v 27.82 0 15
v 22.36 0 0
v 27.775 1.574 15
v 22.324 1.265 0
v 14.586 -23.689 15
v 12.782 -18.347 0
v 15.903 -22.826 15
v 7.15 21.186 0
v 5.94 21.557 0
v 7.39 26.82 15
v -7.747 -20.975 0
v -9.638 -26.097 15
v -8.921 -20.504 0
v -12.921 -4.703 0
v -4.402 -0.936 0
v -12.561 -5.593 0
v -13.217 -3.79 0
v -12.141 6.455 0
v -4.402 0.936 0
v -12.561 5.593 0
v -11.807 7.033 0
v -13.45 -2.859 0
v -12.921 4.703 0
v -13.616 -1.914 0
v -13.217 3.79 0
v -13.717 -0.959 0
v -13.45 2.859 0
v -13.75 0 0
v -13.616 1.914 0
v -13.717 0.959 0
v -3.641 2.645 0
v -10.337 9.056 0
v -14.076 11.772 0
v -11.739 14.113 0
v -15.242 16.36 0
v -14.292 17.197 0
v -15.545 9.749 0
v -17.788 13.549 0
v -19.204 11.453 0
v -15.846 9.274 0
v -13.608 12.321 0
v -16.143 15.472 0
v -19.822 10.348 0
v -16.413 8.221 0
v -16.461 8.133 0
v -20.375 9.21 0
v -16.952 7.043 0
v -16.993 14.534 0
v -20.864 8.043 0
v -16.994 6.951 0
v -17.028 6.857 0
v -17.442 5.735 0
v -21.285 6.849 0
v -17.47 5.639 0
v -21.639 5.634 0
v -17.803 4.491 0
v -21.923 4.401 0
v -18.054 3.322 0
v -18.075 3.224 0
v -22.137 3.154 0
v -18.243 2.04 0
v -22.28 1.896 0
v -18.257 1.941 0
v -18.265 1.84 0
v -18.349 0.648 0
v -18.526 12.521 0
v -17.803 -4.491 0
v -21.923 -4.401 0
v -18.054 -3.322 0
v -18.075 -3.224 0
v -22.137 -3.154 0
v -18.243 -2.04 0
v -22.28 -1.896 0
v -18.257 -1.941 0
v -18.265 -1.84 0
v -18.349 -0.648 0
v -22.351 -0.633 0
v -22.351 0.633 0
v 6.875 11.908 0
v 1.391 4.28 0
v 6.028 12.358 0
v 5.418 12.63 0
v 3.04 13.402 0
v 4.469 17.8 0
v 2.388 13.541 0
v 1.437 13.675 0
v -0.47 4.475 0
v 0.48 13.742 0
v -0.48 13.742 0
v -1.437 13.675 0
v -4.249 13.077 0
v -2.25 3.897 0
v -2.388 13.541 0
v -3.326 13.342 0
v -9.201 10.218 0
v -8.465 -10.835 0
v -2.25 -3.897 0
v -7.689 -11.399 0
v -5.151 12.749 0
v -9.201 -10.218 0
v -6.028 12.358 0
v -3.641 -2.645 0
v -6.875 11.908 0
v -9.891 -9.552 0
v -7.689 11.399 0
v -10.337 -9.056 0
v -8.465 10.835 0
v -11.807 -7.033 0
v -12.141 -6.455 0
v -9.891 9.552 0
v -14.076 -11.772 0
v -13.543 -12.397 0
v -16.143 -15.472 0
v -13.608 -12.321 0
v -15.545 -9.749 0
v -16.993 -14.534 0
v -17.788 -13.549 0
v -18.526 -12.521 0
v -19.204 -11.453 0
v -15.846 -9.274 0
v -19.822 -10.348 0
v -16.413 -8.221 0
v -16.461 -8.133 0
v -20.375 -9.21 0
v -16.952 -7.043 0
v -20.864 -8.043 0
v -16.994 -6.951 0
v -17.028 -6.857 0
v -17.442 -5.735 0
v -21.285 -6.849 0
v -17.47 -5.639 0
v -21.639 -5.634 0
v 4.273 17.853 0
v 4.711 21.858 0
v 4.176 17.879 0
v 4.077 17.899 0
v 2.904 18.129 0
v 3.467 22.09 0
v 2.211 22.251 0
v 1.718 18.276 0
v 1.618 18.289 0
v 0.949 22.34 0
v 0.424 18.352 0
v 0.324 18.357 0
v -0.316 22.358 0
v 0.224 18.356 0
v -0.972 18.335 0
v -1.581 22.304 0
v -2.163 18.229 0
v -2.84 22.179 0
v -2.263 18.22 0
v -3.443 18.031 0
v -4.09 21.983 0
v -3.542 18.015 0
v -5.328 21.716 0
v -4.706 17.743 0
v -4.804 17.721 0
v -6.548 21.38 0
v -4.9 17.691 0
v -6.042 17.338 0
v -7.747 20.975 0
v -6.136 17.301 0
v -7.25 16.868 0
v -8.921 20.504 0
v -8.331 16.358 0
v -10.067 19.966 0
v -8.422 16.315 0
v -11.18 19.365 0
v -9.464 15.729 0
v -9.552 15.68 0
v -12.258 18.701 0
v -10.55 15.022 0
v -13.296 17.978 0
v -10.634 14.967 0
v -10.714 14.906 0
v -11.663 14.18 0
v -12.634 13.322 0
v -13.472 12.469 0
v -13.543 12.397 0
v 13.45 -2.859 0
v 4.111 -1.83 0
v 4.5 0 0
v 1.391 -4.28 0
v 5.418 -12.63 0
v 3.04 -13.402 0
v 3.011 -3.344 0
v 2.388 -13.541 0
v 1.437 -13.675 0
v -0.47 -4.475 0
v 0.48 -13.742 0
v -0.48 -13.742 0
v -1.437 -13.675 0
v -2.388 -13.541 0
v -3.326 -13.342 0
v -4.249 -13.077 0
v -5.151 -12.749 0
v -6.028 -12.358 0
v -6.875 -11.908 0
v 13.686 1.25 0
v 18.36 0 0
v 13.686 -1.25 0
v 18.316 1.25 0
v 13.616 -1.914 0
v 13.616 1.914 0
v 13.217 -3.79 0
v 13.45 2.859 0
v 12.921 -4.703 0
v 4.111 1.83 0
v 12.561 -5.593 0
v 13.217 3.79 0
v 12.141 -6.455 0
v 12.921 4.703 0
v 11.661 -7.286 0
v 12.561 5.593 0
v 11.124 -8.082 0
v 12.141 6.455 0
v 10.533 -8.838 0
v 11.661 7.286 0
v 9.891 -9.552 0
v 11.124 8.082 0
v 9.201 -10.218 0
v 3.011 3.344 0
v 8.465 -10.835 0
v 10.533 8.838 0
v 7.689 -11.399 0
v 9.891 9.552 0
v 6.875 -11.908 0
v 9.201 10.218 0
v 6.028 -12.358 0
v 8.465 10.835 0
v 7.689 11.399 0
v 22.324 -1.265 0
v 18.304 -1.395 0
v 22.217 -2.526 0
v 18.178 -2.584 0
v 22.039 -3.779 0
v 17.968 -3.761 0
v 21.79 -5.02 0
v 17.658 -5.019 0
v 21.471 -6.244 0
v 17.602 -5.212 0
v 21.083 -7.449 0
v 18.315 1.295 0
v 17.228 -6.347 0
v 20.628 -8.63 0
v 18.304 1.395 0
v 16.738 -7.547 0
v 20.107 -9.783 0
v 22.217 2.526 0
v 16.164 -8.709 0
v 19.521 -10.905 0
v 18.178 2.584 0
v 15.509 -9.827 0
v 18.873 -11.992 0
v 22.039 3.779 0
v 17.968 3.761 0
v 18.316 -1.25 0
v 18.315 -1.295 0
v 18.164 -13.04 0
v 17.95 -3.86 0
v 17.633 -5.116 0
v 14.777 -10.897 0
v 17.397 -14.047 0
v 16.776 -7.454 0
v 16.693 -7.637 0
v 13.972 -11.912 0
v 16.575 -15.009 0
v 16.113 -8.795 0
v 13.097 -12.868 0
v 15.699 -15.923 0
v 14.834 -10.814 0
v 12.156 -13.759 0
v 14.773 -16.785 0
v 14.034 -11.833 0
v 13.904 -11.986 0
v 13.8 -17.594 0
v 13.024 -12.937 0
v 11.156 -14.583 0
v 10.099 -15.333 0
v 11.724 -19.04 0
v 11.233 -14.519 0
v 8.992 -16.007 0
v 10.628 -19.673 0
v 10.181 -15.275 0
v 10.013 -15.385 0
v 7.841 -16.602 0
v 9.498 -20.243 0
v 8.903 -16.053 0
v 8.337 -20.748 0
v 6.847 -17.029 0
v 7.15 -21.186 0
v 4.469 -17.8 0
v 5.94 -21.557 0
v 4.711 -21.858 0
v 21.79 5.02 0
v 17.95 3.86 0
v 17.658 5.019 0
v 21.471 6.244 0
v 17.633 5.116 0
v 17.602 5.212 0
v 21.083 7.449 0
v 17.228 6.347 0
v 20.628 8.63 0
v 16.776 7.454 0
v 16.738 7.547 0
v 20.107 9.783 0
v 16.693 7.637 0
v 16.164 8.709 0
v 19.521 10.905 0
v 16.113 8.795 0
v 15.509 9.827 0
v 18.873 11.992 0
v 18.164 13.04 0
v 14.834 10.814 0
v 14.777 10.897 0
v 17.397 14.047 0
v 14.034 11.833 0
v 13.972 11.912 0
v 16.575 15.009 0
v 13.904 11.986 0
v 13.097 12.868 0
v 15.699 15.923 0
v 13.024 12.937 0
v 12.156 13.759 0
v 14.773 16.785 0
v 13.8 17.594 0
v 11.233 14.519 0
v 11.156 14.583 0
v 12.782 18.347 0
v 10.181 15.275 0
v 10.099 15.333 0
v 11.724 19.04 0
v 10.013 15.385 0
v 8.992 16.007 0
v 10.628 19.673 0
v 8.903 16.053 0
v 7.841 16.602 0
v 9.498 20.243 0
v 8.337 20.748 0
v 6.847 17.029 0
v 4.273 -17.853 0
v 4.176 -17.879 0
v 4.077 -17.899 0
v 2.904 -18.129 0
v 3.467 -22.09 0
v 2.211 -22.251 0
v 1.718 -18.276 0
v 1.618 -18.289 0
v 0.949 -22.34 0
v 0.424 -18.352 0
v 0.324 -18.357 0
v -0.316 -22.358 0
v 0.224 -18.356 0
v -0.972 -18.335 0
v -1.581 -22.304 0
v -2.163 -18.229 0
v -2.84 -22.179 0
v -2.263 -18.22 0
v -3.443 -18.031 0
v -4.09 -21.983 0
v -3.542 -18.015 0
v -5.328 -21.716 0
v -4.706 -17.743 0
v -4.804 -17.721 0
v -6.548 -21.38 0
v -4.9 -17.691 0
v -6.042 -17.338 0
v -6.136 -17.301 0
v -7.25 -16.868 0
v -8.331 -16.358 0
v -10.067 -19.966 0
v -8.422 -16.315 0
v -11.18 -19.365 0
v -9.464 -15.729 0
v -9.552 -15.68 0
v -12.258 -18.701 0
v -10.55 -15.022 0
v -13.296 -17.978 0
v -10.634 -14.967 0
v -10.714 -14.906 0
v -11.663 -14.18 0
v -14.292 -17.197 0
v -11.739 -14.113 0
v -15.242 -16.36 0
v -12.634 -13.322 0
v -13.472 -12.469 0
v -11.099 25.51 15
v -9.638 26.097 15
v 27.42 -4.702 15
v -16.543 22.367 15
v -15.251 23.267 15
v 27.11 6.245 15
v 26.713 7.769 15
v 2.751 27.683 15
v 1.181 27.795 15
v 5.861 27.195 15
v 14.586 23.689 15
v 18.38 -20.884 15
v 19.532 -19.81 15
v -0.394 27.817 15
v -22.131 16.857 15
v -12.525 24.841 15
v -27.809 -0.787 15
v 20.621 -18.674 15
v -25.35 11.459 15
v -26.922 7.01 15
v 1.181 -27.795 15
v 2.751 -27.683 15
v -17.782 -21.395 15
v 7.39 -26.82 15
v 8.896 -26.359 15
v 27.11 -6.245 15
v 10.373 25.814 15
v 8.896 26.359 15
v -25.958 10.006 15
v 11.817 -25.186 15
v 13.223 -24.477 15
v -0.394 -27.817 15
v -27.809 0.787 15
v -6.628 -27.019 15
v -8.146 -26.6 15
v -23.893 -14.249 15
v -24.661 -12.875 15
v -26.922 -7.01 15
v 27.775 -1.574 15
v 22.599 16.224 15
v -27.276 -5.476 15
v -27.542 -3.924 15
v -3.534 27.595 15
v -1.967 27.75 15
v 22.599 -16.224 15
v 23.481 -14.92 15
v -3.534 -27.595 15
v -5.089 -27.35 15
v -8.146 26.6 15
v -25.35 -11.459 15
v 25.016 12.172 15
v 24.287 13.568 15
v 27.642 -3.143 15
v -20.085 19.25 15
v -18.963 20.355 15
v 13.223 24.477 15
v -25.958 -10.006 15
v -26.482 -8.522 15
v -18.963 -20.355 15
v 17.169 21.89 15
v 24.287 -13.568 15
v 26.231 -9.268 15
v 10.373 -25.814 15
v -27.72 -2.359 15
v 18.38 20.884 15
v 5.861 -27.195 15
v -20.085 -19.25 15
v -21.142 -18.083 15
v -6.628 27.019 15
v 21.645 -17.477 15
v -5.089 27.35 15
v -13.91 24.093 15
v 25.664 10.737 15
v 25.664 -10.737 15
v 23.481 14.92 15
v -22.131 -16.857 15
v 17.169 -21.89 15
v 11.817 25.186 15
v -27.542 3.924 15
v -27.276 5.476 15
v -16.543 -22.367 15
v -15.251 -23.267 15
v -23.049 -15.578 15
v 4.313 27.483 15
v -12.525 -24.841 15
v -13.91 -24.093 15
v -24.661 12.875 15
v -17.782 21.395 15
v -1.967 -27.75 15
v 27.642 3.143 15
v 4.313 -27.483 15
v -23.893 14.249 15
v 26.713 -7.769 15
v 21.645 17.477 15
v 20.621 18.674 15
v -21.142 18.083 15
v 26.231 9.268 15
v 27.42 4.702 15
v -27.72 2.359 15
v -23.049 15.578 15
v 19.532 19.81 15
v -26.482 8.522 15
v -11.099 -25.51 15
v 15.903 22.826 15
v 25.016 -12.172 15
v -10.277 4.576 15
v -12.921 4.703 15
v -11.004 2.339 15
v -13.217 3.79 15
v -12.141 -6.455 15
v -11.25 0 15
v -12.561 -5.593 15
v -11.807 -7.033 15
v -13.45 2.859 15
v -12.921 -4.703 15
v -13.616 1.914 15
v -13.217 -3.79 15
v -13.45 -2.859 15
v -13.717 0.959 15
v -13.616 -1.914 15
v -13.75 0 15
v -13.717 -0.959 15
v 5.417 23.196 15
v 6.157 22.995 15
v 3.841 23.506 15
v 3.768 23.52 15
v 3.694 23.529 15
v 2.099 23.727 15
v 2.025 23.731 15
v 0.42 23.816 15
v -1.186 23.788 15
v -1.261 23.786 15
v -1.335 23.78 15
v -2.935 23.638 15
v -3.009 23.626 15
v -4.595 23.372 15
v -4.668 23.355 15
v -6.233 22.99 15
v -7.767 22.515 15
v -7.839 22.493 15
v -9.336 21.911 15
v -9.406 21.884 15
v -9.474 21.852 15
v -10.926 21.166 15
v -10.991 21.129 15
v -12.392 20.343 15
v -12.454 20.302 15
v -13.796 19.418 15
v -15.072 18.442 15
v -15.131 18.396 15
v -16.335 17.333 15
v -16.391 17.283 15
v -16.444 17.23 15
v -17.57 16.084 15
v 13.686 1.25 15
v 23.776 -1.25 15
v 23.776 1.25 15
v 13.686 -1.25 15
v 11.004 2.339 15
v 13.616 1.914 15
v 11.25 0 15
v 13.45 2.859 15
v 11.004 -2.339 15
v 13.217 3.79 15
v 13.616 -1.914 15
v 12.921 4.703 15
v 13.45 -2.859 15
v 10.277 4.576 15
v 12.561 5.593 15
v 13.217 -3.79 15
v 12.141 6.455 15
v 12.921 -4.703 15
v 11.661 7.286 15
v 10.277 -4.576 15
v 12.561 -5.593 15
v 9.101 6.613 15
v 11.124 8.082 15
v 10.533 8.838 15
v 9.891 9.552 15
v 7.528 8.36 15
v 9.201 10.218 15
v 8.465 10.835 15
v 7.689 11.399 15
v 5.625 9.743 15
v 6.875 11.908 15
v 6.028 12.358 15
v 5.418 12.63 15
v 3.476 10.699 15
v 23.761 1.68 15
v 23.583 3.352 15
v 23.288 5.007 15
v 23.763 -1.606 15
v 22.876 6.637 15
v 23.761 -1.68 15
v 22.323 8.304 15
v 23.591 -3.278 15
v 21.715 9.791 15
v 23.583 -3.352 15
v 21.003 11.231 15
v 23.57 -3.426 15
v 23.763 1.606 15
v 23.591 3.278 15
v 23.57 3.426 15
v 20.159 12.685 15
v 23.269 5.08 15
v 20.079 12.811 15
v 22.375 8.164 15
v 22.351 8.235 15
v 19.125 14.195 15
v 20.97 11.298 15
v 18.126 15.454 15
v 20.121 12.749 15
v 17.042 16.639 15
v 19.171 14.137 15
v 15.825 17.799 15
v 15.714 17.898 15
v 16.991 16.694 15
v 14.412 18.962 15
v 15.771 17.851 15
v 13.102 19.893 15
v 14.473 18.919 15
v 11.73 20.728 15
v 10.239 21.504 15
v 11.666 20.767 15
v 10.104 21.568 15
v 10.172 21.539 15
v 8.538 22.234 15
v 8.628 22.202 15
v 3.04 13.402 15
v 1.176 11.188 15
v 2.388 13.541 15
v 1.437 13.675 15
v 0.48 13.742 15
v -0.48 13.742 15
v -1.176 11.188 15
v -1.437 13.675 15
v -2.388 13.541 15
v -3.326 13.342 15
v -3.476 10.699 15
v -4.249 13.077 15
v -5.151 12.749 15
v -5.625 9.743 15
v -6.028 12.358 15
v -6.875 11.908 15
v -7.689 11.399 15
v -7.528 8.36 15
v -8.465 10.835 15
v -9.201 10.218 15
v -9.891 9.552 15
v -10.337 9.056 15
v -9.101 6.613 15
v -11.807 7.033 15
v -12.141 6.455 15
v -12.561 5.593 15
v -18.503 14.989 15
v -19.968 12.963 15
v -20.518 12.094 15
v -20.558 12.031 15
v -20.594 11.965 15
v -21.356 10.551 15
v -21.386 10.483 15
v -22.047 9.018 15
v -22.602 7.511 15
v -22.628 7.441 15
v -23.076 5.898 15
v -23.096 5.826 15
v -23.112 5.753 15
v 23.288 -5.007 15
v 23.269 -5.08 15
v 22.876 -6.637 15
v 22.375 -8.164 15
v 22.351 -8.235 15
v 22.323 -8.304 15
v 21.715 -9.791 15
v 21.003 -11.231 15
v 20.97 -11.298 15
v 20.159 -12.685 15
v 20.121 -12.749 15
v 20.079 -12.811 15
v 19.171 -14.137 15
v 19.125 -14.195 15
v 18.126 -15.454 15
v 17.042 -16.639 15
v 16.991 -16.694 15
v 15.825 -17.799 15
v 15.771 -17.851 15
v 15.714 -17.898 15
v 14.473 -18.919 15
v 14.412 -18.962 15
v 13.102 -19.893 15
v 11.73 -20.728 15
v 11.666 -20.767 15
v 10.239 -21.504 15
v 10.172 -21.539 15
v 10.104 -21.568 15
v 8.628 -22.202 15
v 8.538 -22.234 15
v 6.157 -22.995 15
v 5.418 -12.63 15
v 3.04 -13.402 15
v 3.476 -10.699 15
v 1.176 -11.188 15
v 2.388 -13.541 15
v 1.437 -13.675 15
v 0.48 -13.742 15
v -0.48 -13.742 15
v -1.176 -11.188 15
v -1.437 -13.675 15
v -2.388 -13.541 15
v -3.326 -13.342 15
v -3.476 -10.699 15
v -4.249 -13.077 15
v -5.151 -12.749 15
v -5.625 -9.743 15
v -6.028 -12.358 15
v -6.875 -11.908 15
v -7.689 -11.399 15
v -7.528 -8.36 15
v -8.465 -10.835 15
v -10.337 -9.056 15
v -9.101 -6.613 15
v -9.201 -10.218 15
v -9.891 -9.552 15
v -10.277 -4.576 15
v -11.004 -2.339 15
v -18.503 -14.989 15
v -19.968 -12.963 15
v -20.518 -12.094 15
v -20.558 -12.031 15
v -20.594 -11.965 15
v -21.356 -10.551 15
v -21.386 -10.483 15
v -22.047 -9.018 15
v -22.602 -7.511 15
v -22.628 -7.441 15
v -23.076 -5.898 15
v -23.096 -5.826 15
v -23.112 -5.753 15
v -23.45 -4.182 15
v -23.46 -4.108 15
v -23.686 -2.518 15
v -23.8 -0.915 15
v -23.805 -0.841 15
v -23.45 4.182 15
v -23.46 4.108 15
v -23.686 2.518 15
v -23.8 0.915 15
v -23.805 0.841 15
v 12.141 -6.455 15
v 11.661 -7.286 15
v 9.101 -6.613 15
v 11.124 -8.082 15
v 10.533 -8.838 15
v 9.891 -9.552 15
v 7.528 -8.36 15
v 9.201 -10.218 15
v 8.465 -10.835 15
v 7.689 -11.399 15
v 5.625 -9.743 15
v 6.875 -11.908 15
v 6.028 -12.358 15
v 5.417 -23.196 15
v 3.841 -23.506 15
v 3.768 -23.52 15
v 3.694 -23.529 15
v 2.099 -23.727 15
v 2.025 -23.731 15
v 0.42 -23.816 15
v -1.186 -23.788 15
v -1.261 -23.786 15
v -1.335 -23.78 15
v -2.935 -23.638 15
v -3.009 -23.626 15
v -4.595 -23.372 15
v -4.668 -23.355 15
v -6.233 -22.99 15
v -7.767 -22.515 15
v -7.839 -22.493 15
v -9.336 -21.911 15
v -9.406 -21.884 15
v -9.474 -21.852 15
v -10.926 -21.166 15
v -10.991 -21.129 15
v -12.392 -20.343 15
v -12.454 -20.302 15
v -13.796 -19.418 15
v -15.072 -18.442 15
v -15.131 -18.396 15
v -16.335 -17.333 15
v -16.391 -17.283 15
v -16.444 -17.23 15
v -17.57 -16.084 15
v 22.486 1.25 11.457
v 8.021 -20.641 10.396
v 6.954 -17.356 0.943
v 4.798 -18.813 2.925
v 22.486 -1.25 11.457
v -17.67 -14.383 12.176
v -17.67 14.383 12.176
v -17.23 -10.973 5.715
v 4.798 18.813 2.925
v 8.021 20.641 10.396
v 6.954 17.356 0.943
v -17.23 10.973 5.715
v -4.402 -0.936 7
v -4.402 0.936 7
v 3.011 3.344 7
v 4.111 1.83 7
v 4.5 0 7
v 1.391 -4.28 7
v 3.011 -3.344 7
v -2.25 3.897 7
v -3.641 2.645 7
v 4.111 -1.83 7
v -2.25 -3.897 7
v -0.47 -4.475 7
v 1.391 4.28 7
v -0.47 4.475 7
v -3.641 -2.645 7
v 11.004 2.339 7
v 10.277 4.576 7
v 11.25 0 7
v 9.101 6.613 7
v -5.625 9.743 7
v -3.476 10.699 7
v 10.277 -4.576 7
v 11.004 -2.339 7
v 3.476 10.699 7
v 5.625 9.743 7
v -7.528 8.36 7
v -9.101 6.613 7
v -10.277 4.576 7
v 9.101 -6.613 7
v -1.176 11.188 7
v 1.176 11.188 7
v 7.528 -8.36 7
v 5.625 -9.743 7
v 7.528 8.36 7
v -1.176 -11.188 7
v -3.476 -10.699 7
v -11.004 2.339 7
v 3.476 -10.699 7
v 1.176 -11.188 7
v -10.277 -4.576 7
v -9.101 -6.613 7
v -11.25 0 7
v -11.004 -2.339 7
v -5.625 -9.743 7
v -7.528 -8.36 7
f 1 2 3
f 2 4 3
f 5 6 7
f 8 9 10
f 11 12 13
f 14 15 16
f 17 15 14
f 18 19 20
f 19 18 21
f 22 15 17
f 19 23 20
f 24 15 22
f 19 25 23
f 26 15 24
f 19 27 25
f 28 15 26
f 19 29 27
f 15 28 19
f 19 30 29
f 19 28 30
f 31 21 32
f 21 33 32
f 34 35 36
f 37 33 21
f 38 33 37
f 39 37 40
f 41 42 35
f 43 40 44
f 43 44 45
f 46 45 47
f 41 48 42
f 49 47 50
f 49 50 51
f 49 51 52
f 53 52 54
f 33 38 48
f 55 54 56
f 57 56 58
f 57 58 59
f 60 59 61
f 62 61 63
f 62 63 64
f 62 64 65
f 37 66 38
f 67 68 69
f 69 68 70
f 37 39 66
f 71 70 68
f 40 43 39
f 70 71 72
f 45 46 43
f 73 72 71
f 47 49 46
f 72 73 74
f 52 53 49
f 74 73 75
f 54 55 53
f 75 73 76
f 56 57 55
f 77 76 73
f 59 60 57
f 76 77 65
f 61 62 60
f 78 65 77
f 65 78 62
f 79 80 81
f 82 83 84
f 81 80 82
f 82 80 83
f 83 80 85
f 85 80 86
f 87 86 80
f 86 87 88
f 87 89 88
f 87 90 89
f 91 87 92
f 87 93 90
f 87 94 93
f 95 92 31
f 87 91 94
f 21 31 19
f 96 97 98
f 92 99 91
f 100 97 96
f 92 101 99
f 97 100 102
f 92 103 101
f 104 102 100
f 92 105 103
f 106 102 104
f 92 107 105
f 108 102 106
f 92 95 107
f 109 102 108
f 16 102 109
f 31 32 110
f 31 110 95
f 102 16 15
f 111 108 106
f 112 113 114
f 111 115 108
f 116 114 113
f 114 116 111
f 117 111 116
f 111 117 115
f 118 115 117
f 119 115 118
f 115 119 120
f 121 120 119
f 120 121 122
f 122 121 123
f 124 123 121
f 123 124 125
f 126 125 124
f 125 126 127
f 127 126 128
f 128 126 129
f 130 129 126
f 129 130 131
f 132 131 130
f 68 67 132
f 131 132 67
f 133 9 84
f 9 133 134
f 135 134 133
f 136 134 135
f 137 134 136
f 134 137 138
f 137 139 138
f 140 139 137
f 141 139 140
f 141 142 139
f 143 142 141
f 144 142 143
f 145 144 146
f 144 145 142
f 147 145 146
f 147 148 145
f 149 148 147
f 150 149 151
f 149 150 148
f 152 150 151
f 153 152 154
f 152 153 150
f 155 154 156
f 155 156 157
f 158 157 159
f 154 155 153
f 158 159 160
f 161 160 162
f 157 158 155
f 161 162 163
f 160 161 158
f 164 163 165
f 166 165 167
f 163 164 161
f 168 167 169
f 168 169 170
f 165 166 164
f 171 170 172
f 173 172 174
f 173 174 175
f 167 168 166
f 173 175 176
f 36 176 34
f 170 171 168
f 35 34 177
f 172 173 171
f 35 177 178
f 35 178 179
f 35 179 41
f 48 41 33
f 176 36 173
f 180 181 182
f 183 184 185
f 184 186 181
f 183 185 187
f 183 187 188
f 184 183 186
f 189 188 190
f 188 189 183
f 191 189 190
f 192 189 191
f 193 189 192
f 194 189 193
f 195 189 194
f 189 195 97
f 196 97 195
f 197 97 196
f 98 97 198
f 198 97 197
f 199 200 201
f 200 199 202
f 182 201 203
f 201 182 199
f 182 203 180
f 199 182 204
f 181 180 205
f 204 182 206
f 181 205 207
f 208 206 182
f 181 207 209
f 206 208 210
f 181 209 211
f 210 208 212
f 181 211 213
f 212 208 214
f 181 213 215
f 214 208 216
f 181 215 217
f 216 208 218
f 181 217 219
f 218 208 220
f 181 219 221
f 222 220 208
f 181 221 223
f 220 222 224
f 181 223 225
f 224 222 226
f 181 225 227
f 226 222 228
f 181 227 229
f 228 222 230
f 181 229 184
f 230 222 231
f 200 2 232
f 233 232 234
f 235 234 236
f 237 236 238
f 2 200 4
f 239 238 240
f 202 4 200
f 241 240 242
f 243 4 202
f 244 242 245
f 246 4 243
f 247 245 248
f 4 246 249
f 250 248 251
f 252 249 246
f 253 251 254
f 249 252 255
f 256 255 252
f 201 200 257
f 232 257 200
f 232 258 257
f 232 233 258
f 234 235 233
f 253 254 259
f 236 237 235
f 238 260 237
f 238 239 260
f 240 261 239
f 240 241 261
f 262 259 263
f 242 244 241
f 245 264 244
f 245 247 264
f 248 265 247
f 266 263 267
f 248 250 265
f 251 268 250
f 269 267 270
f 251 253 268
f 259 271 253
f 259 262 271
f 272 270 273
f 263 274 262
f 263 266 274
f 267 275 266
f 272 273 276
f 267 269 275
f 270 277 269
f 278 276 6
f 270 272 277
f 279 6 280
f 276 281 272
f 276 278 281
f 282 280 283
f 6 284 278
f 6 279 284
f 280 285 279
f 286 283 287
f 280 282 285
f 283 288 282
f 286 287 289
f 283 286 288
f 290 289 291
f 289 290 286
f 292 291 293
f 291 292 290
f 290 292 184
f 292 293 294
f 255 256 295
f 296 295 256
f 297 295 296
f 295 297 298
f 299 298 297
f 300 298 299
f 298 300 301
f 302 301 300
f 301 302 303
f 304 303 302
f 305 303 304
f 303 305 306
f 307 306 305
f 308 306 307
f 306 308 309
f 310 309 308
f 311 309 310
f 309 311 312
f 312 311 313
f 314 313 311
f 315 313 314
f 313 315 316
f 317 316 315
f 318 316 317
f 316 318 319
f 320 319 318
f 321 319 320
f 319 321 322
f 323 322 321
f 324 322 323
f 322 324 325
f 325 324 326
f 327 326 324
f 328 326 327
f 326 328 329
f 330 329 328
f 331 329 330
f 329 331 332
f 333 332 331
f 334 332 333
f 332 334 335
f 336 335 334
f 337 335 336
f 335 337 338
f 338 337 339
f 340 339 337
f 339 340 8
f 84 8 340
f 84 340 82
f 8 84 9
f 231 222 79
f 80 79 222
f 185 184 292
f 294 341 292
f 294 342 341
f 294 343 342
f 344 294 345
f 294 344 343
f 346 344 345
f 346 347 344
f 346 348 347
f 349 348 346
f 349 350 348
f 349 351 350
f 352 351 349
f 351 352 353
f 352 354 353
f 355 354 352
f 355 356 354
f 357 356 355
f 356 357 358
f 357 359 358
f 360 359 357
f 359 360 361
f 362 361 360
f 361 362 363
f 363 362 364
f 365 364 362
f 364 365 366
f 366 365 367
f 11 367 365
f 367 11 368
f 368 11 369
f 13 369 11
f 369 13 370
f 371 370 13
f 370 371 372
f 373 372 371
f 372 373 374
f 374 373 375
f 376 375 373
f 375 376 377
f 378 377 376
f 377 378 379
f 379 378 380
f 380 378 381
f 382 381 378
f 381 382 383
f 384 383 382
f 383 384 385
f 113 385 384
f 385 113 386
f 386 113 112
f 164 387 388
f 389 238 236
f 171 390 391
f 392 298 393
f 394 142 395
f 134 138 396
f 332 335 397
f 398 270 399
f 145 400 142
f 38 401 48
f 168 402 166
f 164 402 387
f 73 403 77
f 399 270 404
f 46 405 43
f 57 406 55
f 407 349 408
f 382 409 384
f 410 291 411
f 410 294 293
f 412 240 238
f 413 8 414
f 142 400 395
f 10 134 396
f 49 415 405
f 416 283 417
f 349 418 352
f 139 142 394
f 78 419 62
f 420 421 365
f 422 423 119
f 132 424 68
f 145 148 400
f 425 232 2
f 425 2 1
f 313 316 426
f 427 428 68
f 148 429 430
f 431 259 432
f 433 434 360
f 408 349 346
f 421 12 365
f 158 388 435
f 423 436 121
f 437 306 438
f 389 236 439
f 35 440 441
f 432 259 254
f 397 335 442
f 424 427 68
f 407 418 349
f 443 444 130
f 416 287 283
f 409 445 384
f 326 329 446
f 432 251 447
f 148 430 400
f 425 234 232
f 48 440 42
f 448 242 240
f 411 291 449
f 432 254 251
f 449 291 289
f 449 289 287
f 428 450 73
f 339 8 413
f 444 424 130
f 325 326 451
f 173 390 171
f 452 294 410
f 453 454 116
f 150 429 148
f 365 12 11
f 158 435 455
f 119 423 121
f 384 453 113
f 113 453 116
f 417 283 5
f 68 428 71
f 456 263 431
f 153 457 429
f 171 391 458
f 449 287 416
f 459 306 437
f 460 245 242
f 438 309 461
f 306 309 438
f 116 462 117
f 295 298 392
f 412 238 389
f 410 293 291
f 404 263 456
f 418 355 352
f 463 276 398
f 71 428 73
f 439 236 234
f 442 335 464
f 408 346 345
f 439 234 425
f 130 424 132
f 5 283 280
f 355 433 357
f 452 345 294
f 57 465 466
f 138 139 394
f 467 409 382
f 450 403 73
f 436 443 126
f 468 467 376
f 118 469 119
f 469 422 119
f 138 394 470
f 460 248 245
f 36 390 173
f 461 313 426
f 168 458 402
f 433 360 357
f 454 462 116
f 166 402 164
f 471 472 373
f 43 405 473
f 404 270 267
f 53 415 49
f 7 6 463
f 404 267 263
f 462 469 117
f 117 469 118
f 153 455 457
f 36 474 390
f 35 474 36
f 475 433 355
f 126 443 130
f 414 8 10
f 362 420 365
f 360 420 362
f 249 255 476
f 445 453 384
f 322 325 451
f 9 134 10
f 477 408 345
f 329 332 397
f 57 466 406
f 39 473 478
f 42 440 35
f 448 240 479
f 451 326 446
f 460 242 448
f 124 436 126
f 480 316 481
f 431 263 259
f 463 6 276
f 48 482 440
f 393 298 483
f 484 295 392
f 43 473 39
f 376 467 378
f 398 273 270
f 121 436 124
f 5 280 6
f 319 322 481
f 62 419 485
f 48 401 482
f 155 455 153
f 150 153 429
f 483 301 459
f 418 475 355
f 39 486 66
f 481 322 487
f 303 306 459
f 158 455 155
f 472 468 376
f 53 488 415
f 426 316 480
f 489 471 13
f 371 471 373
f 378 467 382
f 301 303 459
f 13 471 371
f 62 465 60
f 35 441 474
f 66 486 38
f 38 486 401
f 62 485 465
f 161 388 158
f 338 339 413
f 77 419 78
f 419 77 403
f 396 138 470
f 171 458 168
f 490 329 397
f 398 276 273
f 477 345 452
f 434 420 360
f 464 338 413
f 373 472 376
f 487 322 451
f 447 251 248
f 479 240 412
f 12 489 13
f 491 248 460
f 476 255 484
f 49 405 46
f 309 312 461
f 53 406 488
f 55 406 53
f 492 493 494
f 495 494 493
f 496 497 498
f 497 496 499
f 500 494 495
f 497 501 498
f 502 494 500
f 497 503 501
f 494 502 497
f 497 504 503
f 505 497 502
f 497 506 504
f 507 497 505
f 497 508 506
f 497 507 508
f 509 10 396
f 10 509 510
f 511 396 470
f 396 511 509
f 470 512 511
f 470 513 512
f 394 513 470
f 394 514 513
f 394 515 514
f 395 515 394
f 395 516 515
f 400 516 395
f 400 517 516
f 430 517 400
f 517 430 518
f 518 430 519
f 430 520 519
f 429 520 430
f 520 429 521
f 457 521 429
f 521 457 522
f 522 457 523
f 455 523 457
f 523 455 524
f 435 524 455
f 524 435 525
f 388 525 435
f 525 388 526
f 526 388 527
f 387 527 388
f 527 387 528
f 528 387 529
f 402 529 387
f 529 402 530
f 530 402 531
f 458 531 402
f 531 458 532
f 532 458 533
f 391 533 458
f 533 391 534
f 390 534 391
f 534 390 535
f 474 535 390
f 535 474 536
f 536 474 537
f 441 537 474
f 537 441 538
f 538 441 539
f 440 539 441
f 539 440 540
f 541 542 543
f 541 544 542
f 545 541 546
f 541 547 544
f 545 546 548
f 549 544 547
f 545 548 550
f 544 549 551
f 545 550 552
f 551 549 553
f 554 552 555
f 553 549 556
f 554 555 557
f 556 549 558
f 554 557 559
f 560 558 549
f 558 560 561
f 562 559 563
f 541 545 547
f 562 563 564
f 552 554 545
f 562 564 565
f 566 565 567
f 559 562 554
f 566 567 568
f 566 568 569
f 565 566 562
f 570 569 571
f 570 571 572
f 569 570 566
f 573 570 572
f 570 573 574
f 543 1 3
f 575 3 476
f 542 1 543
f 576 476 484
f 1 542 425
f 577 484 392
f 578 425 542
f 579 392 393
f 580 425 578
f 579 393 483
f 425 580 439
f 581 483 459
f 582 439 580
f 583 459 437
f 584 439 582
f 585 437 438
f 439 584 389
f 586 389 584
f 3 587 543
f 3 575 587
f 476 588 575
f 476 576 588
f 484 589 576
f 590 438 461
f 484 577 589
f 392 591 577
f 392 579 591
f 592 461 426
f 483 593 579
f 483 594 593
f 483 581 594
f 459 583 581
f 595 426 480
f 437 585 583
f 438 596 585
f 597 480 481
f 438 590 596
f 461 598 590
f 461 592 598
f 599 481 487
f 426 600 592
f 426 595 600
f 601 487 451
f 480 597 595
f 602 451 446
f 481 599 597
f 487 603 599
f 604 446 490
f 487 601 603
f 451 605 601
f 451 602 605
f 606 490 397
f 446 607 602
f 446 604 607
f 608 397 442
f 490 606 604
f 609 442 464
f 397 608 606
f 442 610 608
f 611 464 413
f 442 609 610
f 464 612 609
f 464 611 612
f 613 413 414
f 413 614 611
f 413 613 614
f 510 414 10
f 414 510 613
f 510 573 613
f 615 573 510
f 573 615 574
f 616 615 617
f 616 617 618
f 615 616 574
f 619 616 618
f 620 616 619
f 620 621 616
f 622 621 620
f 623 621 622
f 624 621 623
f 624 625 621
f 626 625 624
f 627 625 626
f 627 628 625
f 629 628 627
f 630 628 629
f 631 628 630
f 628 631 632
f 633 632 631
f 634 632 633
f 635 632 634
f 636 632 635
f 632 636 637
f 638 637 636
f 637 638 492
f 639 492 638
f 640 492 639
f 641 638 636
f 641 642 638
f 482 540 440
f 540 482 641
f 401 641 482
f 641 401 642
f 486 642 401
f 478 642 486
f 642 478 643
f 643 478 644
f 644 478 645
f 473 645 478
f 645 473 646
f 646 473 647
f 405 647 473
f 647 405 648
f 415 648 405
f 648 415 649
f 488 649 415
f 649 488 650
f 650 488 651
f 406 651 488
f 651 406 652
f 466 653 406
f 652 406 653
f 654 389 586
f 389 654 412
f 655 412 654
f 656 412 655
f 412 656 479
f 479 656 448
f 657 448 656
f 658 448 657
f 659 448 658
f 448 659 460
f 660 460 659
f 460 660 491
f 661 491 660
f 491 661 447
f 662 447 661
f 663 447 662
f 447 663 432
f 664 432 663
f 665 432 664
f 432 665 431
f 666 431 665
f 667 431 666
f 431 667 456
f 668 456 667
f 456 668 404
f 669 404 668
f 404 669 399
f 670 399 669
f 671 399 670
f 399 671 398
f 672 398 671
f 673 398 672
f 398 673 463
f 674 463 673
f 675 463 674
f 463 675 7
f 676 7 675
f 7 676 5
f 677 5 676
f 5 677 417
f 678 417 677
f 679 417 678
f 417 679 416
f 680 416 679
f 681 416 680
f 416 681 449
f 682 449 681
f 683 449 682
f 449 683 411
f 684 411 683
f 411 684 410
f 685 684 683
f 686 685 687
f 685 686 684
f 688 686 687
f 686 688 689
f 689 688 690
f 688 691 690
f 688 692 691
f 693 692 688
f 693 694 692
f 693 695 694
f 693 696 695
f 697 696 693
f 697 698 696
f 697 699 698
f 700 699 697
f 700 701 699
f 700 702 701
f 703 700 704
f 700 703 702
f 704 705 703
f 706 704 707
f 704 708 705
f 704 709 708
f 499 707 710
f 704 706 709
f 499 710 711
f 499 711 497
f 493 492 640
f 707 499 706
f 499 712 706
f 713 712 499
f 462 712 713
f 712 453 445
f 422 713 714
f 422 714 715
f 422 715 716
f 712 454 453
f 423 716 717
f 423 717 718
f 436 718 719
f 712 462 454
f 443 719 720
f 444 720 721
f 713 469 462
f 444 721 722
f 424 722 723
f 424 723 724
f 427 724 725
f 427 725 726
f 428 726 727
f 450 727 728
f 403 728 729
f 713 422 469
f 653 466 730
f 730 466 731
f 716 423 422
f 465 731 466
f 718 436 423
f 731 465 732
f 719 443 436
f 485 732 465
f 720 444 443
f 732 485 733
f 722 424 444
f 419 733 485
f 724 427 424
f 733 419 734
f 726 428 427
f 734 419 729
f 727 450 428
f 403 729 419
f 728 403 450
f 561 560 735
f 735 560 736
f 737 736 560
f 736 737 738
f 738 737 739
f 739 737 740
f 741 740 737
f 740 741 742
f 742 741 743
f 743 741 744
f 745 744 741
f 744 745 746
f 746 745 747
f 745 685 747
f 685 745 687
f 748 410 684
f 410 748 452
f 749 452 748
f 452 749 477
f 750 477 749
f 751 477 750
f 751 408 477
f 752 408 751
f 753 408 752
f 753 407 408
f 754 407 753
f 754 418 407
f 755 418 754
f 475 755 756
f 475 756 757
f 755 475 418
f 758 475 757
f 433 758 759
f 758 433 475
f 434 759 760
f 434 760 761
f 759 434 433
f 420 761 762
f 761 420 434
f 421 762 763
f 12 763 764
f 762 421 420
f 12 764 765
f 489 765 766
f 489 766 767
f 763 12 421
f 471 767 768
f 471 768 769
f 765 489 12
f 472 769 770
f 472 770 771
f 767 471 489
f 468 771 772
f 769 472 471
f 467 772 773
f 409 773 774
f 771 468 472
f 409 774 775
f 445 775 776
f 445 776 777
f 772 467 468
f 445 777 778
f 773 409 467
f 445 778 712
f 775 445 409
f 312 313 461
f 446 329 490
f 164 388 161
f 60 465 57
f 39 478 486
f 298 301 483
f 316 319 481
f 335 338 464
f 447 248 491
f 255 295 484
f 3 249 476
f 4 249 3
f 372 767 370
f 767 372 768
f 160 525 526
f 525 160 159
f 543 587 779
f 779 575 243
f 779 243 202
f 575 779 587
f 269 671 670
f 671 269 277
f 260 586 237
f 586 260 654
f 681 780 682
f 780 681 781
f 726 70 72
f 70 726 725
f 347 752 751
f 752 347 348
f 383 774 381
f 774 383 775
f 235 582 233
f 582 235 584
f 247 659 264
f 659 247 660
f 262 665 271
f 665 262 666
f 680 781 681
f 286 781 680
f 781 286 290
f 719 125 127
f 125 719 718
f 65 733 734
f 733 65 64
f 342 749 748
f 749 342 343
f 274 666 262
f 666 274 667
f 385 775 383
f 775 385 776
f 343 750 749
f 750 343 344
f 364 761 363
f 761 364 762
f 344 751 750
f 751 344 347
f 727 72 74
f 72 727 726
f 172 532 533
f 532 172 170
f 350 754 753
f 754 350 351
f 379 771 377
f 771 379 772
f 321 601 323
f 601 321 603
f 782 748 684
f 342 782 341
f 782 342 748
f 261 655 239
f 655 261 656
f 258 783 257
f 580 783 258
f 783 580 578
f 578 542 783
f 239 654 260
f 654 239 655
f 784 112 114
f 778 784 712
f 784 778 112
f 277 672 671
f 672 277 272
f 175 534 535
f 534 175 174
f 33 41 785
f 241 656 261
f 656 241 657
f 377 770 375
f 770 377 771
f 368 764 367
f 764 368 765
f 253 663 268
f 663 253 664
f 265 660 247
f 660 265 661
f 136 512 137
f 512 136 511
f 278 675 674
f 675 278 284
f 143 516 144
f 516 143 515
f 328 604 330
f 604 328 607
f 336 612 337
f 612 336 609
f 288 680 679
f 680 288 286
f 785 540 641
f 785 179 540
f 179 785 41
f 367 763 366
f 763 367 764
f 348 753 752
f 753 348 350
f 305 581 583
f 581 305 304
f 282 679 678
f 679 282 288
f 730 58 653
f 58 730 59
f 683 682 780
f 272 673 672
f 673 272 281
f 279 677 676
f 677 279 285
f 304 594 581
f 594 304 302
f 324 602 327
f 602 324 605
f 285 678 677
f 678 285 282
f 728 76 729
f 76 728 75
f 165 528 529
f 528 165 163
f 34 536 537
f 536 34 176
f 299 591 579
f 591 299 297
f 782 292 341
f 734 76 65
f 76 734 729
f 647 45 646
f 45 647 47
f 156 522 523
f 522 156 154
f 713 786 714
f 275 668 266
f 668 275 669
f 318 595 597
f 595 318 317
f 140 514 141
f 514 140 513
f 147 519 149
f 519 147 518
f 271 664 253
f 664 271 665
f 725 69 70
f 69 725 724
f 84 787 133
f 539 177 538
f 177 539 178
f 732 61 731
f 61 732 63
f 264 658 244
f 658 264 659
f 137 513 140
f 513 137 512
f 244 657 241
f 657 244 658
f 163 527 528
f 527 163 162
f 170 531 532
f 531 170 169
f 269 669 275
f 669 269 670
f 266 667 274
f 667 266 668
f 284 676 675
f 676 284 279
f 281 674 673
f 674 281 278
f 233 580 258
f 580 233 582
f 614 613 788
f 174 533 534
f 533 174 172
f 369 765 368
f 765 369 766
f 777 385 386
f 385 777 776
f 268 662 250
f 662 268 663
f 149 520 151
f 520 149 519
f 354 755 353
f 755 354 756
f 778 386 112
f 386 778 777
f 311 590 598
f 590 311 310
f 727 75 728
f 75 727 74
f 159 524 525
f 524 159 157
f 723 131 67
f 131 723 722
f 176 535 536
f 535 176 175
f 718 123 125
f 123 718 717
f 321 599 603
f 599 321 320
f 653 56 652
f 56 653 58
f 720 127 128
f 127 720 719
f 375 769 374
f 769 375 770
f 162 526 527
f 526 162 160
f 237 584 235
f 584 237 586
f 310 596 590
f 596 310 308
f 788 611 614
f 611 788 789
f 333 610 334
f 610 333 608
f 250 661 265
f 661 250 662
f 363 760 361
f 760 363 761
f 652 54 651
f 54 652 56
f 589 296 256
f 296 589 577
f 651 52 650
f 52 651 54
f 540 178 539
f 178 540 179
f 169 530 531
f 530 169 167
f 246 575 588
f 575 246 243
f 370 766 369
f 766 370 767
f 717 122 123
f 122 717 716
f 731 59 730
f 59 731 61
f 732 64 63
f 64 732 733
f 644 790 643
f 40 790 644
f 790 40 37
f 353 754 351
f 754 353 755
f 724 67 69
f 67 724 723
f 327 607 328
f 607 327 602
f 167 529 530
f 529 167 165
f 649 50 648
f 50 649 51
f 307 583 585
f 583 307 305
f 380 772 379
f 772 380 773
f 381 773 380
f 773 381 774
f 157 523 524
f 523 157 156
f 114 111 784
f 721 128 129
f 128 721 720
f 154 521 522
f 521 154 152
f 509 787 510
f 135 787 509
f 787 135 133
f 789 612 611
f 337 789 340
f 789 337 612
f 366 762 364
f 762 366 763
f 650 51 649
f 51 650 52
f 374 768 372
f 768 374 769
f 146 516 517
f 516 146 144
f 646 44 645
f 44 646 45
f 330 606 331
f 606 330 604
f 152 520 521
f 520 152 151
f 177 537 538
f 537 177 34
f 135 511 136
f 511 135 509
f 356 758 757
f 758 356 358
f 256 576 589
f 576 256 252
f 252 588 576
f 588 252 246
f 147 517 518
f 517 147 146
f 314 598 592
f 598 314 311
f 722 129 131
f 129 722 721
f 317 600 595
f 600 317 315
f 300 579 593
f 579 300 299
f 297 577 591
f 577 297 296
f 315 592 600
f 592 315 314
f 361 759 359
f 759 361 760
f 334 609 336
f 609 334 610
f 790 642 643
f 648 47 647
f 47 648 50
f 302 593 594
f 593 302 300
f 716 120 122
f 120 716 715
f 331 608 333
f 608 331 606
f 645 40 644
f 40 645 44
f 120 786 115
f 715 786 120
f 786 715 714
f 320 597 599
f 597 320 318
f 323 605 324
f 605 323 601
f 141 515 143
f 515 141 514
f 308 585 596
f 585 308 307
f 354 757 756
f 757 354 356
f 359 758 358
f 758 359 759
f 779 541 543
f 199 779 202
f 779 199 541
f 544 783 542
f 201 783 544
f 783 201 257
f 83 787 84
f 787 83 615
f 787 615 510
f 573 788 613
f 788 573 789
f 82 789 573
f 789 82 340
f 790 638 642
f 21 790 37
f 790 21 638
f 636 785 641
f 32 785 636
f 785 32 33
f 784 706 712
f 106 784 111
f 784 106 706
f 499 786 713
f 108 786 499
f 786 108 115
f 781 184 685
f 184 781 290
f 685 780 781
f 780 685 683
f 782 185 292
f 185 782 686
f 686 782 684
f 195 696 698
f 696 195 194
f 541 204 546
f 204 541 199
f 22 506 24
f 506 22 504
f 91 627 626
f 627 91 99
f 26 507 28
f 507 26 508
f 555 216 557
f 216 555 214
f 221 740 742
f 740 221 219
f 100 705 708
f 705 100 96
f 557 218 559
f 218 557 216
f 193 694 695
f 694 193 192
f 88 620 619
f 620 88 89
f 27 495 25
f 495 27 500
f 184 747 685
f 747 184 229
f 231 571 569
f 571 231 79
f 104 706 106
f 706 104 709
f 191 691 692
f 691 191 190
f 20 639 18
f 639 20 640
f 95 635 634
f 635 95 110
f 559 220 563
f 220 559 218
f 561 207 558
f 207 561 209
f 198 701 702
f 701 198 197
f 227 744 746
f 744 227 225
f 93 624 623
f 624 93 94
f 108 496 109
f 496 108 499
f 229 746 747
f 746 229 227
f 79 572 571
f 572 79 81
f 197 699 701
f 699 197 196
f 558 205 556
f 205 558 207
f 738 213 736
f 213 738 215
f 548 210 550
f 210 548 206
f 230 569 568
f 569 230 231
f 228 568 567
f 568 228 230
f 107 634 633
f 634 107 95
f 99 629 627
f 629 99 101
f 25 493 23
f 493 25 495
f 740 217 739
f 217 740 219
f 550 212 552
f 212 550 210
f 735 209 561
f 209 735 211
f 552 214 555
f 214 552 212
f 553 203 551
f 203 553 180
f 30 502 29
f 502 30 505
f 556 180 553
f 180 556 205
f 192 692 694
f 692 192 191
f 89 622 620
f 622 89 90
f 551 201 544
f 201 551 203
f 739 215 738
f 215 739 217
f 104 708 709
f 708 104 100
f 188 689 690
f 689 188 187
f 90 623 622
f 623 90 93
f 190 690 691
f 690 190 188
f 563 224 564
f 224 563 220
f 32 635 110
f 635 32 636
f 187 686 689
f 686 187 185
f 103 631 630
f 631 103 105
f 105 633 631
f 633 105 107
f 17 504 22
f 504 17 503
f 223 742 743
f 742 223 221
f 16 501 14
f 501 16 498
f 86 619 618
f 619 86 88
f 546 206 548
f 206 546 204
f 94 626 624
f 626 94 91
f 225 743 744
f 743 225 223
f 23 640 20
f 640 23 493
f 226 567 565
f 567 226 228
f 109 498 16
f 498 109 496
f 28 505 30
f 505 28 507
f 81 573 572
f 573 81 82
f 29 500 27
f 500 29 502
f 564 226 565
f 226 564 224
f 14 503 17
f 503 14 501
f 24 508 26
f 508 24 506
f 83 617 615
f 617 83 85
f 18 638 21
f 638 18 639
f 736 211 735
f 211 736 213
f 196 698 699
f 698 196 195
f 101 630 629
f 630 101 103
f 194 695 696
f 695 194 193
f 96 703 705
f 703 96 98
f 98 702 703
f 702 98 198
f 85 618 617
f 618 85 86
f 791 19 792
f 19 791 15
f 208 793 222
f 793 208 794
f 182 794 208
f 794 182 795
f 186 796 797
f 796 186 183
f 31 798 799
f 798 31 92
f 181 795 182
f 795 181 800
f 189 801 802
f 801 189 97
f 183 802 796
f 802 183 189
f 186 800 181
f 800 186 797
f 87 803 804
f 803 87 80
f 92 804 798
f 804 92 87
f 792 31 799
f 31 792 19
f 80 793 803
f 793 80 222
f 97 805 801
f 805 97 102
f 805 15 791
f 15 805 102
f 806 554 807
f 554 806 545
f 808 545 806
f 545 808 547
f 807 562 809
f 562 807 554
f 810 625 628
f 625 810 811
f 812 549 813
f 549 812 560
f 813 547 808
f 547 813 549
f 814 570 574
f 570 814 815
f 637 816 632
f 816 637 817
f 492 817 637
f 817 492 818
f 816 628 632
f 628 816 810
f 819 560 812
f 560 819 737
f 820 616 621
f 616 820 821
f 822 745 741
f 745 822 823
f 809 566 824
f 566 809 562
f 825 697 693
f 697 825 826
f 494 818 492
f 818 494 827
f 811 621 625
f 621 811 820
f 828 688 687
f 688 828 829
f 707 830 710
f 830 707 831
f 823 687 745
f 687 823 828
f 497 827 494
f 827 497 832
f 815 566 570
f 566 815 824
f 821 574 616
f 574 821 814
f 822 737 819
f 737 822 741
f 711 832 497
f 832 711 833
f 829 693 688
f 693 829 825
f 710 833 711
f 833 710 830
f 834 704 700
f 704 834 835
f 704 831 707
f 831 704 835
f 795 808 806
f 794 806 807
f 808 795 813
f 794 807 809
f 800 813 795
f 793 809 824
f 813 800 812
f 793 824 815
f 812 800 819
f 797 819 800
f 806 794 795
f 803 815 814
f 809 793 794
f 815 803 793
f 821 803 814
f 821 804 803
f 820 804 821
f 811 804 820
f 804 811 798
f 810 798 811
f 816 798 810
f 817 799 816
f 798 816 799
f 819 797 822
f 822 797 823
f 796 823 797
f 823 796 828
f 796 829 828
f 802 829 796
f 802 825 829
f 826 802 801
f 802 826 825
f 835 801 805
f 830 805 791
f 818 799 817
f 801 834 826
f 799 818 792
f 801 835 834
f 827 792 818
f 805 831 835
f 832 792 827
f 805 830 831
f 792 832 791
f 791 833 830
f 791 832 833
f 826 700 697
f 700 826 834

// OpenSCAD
// wheel for supporting the spool on spool holder
// use parameters to adapt it to your spool

spoolDia      = 52;   //mm - diameter of spool hole
wheelSlope    = 20;   //degrees - slope of wheel outer ring
wheelHeight   = 15;   //mm - height of wheel
outerOverhang =  5;   //mm - how much of wheel will be out of spool 
ring_wall     =  4;   //mm - thickness of wall of outer ring
rib_wall      =  2.5; //mm - thickness of ribs and wall around bearing
numberOfRibs  =  5;   // count - number of ribs

bearing_dout = 22.5;  //mm - outer diameter of 608
bearing_din  = 9;     //mm - inner diameter of 608
bearing_b    = 8;     //mm - width of 608

// calculated variables
big_rad = spoolDia/2 + outerOverhang*tan(wheelSlope); // big radius of wheel
small_rad = big_rad - wheelHeight*tan(wheelSlope);// small radius of wheel

// print calculated values
echo(str("original slope = ",atan((60-50)/2/15)," degrees"));
echo(str("big diameter = ",2*big_rad," mm"));
echo(str("small diameter = ",2*small_rad," mm"));

// module for generating parametric wheel
module wheel() {
	difference() {

		// outer shape
		union() {

			// outer ring
			difference() {
				cylinder(h=wheelHeight, r1=small_rad, r2=big_rad, $fn=4*big_rad);
				translate([0,0,-1]) cylinder(h=wheelHeight+2, r1=small_rad-ring_wall-1*tan(wheelSlope), r2=big_rad-ring_wall+1*tan(wheelSlope), $fn=4*small_rad);
			}

			// hub
			cylinder(h=wheelHeight, r=bearing_dout/2+rib_wall, $fn=4*bearing_dout);

			// ribs
			for(i= [0:numberOfRibs-1]) {
				rotate([0,0,i*360/numberOfRibs])
				difference() {
					translate([0,-rib_wall/2,0]) cube([big_rad,rib_wall,wheelHeight]);
					translate([small_rad-ring_wall,-rib_wall/2-1,0]) rotate([0,wheelSlope,0]) cube([wheelHeight,rib_wall+2,(wheelHeight+2)/cos(wheelSlope)]);
				}
			}
		}

		// hole through and hole for bearing
		translate([0,0,-1]) cylinder(h=wheelHeight+2, r=bearing_din/2);
		translate([0,0,wheelHeight-bearing_b]) cylinder(h=bearing_b+1, r=bearing_dout/2);
	}
}

// generate wheel
wheel();
